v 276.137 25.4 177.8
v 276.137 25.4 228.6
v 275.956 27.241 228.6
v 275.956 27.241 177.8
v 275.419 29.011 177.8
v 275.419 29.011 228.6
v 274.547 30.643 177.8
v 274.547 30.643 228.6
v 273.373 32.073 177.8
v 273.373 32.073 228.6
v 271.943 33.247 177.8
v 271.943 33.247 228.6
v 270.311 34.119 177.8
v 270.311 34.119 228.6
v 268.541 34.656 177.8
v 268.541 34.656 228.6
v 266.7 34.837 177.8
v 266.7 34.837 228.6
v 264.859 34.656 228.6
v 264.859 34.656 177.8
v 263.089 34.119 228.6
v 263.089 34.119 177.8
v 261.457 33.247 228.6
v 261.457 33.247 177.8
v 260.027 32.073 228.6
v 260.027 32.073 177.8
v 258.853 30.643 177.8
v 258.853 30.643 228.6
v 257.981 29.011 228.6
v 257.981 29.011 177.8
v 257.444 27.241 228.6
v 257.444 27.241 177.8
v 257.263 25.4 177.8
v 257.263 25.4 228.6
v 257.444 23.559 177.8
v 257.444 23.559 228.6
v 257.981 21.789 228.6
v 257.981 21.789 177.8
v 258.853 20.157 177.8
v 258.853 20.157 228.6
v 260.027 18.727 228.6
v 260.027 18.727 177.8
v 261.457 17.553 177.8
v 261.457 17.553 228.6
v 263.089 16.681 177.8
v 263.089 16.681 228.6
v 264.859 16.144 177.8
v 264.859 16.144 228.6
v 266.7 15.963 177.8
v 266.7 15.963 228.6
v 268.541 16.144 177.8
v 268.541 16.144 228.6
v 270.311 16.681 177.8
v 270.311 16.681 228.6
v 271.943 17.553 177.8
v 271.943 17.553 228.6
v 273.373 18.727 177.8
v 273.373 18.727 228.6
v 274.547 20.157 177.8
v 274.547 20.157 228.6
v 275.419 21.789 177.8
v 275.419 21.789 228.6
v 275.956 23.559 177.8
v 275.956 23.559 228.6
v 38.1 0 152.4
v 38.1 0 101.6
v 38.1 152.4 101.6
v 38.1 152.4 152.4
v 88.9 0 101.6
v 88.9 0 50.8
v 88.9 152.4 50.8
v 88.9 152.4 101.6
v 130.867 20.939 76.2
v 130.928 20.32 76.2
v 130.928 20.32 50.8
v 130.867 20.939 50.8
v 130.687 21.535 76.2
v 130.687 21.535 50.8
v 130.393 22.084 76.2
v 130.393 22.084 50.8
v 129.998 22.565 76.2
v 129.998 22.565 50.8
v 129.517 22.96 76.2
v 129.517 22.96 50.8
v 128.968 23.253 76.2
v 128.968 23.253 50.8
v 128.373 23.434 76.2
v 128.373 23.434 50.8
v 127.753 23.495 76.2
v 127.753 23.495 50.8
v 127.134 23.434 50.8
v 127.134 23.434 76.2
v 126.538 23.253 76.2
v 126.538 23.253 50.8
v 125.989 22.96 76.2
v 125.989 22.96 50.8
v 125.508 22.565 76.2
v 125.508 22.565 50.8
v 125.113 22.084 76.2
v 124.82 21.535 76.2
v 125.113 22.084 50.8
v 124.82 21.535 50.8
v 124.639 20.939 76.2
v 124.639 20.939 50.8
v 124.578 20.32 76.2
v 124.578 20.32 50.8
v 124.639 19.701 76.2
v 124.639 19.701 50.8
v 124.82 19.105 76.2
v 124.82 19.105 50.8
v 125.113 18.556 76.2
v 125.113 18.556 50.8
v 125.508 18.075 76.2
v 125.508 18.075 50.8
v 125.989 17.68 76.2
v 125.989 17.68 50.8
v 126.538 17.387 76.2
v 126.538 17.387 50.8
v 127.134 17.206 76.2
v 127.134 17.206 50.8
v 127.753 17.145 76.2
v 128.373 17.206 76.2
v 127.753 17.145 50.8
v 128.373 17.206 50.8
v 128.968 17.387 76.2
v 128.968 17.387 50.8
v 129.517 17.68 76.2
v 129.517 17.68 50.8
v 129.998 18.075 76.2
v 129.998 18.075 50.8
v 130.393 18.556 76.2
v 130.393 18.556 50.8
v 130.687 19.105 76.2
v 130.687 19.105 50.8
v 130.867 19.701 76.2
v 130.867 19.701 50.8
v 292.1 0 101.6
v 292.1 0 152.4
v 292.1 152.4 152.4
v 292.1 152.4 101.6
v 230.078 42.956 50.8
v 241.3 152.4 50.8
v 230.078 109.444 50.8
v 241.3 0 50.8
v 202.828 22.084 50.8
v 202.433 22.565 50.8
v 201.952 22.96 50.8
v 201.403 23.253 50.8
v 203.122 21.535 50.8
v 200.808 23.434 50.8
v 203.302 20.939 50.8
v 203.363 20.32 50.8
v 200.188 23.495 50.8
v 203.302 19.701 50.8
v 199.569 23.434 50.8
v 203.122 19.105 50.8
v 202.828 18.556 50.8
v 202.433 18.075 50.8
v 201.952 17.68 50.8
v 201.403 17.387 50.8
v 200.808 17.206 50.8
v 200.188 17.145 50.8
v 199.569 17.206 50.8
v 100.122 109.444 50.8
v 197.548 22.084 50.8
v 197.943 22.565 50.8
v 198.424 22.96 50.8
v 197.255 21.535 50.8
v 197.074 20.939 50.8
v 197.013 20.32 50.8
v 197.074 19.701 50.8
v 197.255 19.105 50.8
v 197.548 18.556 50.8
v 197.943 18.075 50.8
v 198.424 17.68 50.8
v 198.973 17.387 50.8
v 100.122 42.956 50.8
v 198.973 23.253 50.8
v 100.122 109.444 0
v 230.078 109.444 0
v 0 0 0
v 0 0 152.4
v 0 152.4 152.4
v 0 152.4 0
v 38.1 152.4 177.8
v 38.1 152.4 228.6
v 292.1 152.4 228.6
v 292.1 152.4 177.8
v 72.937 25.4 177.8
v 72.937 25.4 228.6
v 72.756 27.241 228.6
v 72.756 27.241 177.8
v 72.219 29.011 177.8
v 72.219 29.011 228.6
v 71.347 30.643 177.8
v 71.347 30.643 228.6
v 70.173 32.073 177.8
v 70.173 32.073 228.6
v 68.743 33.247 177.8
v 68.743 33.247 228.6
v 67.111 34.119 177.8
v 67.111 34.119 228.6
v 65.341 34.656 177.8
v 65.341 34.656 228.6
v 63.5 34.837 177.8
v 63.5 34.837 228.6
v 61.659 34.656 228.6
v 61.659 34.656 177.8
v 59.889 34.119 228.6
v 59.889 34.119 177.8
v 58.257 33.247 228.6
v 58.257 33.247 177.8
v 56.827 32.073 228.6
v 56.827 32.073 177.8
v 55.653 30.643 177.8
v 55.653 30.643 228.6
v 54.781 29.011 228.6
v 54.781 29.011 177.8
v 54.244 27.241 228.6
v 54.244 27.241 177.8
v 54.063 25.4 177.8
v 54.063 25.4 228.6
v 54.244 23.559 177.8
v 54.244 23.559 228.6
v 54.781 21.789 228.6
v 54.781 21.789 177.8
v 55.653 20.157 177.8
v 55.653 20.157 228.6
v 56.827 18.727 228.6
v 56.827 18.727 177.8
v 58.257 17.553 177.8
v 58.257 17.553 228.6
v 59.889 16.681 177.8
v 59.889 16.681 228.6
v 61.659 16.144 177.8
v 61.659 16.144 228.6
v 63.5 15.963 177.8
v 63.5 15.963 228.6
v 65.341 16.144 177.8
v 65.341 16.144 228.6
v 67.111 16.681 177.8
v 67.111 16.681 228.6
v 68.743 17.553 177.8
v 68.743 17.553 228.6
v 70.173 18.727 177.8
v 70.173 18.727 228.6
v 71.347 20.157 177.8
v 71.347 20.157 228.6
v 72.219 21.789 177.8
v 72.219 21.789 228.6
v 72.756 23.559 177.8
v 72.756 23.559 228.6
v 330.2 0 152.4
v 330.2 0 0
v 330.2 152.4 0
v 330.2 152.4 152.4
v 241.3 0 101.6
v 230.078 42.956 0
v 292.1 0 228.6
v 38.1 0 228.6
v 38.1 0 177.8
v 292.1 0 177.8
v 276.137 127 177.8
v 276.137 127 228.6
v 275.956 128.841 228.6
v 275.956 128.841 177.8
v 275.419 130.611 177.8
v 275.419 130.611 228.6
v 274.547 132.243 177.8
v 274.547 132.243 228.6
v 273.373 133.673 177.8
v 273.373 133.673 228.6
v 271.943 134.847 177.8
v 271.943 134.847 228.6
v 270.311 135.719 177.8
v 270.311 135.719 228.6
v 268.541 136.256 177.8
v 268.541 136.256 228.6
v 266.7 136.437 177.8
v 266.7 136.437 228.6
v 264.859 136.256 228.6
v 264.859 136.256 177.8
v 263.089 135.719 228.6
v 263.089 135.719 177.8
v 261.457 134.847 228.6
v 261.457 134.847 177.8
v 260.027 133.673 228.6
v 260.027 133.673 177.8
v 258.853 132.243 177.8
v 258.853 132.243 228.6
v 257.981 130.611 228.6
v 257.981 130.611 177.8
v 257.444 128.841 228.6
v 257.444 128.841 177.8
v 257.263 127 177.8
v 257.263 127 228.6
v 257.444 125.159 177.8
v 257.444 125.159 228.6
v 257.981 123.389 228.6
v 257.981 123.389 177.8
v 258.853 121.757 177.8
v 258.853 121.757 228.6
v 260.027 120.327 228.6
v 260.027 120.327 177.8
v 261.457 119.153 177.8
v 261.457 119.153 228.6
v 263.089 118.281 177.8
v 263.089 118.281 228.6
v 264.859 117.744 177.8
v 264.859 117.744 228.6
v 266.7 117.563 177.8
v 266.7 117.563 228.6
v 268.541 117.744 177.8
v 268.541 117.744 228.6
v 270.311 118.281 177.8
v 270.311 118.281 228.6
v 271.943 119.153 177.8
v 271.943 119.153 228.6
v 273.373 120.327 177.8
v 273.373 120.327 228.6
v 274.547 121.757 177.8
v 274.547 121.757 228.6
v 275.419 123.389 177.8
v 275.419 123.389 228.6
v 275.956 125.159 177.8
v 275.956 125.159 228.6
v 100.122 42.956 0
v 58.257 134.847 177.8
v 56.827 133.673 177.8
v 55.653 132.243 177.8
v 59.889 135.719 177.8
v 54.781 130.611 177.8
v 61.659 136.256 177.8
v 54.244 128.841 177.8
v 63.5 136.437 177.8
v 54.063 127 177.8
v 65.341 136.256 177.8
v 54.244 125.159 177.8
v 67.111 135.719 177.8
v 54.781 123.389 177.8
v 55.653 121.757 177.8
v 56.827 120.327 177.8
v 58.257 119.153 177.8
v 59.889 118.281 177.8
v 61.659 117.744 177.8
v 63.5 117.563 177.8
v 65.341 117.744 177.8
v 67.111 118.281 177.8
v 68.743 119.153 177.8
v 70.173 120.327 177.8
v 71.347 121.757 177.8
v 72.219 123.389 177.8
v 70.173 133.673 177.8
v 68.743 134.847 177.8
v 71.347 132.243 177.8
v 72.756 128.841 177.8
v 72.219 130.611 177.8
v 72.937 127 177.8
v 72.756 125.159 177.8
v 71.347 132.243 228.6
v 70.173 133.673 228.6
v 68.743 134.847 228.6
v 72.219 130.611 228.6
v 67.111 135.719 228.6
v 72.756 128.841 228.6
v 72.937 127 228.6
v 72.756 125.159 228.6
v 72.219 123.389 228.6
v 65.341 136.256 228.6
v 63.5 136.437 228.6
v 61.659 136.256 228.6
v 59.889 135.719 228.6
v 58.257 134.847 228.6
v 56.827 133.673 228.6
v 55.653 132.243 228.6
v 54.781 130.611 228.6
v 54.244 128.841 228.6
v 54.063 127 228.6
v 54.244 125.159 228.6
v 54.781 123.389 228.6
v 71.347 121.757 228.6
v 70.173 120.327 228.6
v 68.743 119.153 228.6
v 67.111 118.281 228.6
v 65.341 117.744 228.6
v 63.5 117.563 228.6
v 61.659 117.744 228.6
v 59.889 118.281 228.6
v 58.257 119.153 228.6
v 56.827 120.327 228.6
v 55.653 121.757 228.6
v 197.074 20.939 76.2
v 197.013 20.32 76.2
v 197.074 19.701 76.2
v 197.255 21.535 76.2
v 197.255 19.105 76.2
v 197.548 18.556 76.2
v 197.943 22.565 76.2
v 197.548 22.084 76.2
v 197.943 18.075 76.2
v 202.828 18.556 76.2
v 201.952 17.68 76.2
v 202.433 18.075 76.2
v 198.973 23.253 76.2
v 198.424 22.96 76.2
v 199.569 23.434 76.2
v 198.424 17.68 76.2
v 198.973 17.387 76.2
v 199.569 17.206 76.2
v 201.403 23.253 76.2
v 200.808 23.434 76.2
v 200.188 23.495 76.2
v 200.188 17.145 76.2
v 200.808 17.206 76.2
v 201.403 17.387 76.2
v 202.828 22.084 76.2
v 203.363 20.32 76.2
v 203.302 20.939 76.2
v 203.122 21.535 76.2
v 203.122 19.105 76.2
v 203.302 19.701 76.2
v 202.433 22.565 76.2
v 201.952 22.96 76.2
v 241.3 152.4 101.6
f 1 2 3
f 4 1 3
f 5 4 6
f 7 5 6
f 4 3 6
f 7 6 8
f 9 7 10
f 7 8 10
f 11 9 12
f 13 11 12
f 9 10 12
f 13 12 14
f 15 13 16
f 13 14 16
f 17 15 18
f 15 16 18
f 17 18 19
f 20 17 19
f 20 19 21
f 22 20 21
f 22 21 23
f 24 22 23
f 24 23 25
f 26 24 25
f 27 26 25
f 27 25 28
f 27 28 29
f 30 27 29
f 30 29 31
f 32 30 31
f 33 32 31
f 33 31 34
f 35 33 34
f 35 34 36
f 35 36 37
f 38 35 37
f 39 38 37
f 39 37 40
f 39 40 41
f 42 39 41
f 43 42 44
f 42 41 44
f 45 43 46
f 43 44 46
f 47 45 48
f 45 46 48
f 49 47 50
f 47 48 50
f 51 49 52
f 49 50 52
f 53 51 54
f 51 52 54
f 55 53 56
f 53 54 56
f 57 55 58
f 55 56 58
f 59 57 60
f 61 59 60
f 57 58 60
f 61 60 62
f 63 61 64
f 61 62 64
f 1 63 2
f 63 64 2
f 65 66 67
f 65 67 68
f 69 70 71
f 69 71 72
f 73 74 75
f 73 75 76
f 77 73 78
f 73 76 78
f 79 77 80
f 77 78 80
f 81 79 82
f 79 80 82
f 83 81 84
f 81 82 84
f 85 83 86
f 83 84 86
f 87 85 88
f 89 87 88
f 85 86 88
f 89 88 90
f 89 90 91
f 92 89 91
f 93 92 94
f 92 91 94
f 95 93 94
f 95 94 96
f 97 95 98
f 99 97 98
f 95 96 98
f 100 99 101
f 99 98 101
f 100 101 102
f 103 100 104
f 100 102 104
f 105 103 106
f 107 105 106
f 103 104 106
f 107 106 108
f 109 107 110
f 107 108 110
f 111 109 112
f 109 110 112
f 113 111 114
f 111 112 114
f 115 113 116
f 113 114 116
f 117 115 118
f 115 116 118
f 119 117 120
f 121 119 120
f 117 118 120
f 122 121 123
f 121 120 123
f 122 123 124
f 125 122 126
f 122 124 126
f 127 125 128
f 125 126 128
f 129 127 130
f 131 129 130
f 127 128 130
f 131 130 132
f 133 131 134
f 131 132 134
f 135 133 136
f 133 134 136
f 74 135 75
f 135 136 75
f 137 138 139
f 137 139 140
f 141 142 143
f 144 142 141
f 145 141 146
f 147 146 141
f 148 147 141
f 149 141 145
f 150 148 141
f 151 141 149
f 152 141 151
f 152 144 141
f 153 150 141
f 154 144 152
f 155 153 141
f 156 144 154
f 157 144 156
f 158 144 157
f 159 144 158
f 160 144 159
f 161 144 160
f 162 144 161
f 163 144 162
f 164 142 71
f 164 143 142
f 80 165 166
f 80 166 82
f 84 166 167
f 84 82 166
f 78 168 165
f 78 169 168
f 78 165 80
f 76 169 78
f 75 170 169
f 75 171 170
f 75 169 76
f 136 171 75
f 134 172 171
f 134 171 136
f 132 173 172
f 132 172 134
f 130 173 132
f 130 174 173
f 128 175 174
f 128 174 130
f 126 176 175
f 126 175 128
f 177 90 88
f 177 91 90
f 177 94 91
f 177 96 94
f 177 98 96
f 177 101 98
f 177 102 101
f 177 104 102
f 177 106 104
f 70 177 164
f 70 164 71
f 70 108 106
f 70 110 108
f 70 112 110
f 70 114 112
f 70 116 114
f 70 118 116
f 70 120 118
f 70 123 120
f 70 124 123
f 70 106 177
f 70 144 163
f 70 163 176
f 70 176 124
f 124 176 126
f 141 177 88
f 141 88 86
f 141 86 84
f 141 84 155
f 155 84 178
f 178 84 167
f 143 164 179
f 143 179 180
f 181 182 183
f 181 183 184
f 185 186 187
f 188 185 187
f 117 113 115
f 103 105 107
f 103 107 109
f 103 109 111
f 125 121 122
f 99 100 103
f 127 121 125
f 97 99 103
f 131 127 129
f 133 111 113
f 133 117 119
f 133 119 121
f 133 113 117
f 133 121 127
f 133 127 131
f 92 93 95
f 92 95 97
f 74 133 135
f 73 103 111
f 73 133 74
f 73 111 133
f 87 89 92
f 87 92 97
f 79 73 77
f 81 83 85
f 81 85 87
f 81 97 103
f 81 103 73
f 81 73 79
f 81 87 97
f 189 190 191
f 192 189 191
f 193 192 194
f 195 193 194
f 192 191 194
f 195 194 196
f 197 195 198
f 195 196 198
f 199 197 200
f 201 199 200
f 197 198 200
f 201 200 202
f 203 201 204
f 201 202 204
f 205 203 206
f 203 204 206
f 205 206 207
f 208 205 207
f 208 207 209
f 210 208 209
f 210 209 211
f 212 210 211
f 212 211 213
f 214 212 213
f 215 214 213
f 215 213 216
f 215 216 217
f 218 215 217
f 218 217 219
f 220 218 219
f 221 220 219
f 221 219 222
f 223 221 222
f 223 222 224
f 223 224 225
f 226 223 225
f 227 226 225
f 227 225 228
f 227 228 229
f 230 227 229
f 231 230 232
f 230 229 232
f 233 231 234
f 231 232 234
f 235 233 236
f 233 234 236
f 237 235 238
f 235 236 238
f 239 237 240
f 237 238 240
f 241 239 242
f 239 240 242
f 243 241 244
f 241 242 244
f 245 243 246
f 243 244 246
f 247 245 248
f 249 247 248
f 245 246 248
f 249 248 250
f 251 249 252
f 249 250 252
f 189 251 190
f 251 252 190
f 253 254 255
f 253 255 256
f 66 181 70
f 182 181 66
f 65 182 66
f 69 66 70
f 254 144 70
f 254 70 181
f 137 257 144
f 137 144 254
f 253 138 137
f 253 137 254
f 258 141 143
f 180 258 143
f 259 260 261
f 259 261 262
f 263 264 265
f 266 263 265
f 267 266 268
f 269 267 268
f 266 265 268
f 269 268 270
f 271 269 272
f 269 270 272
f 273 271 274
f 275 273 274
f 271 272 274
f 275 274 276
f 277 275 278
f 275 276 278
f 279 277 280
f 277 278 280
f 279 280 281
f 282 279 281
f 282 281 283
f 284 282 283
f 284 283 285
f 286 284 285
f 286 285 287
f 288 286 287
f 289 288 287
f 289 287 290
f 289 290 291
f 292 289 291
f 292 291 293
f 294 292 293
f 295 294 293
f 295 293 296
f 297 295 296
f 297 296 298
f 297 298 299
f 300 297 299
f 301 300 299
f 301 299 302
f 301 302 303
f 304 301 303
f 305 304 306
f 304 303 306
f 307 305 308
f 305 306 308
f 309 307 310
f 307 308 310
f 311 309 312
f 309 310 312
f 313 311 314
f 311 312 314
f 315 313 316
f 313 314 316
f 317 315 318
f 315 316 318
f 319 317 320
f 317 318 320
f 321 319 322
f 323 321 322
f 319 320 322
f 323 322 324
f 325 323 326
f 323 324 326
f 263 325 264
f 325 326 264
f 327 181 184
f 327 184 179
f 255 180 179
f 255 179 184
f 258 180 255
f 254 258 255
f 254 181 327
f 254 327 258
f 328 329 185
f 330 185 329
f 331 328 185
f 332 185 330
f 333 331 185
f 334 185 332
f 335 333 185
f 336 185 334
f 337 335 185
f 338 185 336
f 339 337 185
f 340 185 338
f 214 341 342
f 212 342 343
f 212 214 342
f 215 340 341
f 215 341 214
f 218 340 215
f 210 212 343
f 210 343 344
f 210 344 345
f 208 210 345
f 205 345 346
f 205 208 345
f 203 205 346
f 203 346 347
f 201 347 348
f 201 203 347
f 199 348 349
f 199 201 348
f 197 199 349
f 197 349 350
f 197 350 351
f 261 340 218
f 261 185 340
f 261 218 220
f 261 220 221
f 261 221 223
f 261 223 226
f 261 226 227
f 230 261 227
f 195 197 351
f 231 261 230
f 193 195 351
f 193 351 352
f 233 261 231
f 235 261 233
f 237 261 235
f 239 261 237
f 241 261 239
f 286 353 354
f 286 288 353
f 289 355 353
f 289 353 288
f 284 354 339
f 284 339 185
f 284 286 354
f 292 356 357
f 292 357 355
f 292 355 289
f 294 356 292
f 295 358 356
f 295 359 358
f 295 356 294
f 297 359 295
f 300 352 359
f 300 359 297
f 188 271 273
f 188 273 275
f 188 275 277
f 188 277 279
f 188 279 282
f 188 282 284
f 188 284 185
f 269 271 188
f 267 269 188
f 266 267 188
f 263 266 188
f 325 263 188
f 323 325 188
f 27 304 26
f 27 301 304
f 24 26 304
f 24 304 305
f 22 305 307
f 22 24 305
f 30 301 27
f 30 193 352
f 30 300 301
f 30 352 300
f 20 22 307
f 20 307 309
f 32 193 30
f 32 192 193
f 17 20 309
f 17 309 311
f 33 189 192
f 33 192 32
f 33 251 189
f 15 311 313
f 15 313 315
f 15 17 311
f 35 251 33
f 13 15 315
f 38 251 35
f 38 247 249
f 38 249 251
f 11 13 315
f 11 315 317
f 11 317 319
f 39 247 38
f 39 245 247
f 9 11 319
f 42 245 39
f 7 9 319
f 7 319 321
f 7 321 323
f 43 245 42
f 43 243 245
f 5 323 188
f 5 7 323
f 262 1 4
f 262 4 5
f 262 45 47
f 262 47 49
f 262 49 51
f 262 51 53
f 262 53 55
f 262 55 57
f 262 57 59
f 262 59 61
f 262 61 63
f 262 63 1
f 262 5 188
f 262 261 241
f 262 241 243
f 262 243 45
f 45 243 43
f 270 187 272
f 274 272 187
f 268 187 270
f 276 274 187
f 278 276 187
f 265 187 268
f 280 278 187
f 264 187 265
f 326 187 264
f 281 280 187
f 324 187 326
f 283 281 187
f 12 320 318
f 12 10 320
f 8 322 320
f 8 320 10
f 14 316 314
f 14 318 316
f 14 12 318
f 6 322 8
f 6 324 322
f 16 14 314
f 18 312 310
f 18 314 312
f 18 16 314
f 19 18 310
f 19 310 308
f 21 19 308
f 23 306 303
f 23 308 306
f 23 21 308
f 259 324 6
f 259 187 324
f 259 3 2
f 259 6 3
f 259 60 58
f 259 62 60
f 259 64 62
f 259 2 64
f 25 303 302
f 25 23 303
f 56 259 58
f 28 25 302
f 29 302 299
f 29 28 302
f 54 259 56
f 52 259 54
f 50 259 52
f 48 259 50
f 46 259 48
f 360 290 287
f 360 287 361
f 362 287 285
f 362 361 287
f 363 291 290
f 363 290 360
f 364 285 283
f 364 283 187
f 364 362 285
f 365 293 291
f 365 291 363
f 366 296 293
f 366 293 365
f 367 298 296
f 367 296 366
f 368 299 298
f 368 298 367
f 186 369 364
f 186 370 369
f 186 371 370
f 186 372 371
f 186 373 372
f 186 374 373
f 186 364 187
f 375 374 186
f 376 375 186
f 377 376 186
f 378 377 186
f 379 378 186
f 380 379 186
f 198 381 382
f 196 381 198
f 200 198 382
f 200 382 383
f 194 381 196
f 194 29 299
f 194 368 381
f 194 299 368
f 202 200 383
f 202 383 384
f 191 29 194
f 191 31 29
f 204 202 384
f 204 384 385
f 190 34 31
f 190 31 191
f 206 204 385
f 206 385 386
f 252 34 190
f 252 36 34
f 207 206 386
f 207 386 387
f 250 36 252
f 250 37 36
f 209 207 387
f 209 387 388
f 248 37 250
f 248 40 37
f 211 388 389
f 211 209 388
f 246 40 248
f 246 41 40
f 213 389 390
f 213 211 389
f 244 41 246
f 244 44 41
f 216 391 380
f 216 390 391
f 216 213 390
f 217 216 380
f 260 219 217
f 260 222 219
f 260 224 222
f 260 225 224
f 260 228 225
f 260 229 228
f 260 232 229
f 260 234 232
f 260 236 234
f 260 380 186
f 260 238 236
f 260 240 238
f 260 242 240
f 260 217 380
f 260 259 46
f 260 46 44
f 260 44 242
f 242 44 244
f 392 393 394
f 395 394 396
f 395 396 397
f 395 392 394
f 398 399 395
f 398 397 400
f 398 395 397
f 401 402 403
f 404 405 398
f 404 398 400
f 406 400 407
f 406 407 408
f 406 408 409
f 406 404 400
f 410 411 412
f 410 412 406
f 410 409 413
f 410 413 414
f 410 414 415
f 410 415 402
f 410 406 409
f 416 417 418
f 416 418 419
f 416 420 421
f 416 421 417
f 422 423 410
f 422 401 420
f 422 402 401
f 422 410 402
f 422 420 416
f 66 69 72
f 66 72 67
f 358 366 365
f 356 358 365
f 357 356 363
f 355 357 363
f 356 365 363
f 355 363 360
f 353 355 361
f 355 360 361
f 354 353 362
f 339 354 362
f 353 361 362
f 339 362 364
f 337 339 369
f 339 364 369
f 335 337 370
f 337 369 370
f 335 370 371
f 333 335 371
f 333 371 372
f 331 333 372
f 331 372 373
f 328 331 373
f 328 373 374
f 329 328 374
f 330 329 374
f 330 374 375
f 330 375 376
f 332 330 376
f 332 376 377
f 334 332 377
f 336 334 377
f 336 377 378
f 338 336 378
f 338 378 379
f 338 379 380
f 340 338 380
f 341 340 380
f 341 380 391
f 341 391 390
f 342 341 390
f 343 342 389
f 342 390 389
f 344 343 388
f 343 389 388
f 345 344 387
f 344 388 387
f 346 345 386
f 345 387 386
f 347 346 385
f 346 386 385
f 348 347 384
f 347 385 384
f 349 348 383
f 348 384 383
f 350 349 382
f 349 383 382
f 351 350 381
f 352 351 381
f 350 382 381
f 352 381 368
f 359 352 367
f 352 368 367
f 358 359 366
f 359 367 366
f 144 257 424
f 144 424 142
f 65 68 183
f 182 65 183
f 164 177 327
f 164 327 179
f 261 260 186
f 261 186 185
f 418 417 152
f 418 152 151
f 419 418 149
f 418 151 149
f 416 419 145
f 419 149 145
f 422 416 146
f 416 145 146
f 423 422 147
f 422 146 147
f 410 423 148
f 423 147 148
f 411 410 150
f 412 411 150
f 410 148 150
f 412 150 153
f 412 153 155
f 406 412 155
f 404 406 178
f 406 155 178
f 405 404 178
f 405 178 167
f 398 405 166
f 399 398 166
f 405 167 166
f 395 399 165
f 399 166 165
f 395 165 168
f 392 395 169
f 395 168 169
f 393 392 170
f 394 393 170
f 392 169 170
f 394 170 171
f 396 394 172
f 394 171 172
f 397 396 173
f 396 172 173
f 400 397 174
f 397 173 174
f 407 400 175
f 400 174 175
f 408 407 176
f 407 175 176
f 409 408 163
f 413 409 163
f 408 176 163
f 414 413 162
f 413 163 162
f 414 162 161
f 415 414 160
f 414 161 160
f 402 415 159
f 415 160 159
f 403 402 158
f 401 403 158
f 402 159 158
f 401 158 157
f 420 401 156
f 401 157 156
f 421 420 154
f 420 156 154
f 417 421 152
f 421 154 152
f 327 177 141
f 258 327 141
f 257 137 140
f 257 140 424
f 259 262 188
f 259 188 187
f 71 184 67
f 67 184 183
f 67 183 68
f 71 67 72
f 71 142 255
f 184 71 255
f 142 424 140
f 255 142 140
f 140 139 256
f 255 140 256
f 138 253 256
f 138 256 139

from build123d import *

# Parameters (mm, degrees)
F6_W      = 76.2
F6_H      = 50.8
F7_DEPTH  = 152.4
F0_W      = 129.9560666084
F0_H      = 66.4875675201
F1_DEPTH  = 50.801
F9_DEPTH  = 152.4
F2_R      = 3.175
F3_DEPTH  = 25.4
F4_R      = 9.4371110392
F10_DEPTH = 228.601


with BuildPart() as f7:
    # F6 (on Front) → F7 (new body)
    with BuildSketch(Plane.XZ):
        Polygon((0, 152.4), (0, 0), (38.1, 0), (38.1, 101.6), (38.1, 152.4), align=None)
        with Locations((127, 25.4)):
            Rectangle(F6_W, F6_H)
        Polygon((38.1, 101.6), (38.1, 0), (88.9, 0), (88.9, 50.8), (88.9, 101.6), align=None)
        with Locations((203.2, 25.4)):
            Rectangle(F6_W, F6_H)
        Polygon((241.3, 50.8), (241.3, 0), (292.1, 0), (292.1, 101.6), (241.3, 101.6), align=None)
        Polygon((292.1, 101.6), (292.1, 0), (330.2, 0), (330.2, 152.4), (292.1, 152.4), align=None)
    extrude(amount=-F7_DEPTH)

    # F0 (on face) → F1 (cut, through all)
    with BuildSketch(Plane.XY.offset(50.8)):
        with Locations((165.1, 76.2)):
            Rectangle(F0_W, F0_H)
    extrude(amount=-F1_DEPTH, mode=Mode.SUBTRACT)

    # F2 (on face) → F3 (join)
    with BuildSketch(Plane.XY.offset(50.8)):
        with Locations((127.7533173561, 20.32)):
            Circle(F2_R)
        with Locations((200.1881897449, 20.32)):
            Circle(F2_R)
    extrude(amount=F3_DEPTH)


with BuildPart() as f9:
    # F8 (on Front) → F9 (new body)
    with BuildSketch(Plane.XZ):
        Polygon((38.1, 228.6), (38.1, 177.8), (139.7, 177.8), (190.5, 177.8), (292.1, 177.8), (292.1, 228.6), align=None)
    extrude(amount=-F9_DEPTH)

    # F4 (on face) → F10 (cut, through all)
    with BuildSketch(Plane.XY.offset(228.6)):
        with Locations((63.5, 25.4)):
            Circle(F4_R)
        with Locations((63.5, 127)):
            Circle(F4_R)
        with Locations((266.7, 25.4)):
            Circle(F4_R)
        with Locations((266.7, 127)):
            Circle(F4_R)
    extrude(amount=-F10_DEPTH, mode=Mode.SUBTRACT)


solid = Compound([f7.part, f9.part])
